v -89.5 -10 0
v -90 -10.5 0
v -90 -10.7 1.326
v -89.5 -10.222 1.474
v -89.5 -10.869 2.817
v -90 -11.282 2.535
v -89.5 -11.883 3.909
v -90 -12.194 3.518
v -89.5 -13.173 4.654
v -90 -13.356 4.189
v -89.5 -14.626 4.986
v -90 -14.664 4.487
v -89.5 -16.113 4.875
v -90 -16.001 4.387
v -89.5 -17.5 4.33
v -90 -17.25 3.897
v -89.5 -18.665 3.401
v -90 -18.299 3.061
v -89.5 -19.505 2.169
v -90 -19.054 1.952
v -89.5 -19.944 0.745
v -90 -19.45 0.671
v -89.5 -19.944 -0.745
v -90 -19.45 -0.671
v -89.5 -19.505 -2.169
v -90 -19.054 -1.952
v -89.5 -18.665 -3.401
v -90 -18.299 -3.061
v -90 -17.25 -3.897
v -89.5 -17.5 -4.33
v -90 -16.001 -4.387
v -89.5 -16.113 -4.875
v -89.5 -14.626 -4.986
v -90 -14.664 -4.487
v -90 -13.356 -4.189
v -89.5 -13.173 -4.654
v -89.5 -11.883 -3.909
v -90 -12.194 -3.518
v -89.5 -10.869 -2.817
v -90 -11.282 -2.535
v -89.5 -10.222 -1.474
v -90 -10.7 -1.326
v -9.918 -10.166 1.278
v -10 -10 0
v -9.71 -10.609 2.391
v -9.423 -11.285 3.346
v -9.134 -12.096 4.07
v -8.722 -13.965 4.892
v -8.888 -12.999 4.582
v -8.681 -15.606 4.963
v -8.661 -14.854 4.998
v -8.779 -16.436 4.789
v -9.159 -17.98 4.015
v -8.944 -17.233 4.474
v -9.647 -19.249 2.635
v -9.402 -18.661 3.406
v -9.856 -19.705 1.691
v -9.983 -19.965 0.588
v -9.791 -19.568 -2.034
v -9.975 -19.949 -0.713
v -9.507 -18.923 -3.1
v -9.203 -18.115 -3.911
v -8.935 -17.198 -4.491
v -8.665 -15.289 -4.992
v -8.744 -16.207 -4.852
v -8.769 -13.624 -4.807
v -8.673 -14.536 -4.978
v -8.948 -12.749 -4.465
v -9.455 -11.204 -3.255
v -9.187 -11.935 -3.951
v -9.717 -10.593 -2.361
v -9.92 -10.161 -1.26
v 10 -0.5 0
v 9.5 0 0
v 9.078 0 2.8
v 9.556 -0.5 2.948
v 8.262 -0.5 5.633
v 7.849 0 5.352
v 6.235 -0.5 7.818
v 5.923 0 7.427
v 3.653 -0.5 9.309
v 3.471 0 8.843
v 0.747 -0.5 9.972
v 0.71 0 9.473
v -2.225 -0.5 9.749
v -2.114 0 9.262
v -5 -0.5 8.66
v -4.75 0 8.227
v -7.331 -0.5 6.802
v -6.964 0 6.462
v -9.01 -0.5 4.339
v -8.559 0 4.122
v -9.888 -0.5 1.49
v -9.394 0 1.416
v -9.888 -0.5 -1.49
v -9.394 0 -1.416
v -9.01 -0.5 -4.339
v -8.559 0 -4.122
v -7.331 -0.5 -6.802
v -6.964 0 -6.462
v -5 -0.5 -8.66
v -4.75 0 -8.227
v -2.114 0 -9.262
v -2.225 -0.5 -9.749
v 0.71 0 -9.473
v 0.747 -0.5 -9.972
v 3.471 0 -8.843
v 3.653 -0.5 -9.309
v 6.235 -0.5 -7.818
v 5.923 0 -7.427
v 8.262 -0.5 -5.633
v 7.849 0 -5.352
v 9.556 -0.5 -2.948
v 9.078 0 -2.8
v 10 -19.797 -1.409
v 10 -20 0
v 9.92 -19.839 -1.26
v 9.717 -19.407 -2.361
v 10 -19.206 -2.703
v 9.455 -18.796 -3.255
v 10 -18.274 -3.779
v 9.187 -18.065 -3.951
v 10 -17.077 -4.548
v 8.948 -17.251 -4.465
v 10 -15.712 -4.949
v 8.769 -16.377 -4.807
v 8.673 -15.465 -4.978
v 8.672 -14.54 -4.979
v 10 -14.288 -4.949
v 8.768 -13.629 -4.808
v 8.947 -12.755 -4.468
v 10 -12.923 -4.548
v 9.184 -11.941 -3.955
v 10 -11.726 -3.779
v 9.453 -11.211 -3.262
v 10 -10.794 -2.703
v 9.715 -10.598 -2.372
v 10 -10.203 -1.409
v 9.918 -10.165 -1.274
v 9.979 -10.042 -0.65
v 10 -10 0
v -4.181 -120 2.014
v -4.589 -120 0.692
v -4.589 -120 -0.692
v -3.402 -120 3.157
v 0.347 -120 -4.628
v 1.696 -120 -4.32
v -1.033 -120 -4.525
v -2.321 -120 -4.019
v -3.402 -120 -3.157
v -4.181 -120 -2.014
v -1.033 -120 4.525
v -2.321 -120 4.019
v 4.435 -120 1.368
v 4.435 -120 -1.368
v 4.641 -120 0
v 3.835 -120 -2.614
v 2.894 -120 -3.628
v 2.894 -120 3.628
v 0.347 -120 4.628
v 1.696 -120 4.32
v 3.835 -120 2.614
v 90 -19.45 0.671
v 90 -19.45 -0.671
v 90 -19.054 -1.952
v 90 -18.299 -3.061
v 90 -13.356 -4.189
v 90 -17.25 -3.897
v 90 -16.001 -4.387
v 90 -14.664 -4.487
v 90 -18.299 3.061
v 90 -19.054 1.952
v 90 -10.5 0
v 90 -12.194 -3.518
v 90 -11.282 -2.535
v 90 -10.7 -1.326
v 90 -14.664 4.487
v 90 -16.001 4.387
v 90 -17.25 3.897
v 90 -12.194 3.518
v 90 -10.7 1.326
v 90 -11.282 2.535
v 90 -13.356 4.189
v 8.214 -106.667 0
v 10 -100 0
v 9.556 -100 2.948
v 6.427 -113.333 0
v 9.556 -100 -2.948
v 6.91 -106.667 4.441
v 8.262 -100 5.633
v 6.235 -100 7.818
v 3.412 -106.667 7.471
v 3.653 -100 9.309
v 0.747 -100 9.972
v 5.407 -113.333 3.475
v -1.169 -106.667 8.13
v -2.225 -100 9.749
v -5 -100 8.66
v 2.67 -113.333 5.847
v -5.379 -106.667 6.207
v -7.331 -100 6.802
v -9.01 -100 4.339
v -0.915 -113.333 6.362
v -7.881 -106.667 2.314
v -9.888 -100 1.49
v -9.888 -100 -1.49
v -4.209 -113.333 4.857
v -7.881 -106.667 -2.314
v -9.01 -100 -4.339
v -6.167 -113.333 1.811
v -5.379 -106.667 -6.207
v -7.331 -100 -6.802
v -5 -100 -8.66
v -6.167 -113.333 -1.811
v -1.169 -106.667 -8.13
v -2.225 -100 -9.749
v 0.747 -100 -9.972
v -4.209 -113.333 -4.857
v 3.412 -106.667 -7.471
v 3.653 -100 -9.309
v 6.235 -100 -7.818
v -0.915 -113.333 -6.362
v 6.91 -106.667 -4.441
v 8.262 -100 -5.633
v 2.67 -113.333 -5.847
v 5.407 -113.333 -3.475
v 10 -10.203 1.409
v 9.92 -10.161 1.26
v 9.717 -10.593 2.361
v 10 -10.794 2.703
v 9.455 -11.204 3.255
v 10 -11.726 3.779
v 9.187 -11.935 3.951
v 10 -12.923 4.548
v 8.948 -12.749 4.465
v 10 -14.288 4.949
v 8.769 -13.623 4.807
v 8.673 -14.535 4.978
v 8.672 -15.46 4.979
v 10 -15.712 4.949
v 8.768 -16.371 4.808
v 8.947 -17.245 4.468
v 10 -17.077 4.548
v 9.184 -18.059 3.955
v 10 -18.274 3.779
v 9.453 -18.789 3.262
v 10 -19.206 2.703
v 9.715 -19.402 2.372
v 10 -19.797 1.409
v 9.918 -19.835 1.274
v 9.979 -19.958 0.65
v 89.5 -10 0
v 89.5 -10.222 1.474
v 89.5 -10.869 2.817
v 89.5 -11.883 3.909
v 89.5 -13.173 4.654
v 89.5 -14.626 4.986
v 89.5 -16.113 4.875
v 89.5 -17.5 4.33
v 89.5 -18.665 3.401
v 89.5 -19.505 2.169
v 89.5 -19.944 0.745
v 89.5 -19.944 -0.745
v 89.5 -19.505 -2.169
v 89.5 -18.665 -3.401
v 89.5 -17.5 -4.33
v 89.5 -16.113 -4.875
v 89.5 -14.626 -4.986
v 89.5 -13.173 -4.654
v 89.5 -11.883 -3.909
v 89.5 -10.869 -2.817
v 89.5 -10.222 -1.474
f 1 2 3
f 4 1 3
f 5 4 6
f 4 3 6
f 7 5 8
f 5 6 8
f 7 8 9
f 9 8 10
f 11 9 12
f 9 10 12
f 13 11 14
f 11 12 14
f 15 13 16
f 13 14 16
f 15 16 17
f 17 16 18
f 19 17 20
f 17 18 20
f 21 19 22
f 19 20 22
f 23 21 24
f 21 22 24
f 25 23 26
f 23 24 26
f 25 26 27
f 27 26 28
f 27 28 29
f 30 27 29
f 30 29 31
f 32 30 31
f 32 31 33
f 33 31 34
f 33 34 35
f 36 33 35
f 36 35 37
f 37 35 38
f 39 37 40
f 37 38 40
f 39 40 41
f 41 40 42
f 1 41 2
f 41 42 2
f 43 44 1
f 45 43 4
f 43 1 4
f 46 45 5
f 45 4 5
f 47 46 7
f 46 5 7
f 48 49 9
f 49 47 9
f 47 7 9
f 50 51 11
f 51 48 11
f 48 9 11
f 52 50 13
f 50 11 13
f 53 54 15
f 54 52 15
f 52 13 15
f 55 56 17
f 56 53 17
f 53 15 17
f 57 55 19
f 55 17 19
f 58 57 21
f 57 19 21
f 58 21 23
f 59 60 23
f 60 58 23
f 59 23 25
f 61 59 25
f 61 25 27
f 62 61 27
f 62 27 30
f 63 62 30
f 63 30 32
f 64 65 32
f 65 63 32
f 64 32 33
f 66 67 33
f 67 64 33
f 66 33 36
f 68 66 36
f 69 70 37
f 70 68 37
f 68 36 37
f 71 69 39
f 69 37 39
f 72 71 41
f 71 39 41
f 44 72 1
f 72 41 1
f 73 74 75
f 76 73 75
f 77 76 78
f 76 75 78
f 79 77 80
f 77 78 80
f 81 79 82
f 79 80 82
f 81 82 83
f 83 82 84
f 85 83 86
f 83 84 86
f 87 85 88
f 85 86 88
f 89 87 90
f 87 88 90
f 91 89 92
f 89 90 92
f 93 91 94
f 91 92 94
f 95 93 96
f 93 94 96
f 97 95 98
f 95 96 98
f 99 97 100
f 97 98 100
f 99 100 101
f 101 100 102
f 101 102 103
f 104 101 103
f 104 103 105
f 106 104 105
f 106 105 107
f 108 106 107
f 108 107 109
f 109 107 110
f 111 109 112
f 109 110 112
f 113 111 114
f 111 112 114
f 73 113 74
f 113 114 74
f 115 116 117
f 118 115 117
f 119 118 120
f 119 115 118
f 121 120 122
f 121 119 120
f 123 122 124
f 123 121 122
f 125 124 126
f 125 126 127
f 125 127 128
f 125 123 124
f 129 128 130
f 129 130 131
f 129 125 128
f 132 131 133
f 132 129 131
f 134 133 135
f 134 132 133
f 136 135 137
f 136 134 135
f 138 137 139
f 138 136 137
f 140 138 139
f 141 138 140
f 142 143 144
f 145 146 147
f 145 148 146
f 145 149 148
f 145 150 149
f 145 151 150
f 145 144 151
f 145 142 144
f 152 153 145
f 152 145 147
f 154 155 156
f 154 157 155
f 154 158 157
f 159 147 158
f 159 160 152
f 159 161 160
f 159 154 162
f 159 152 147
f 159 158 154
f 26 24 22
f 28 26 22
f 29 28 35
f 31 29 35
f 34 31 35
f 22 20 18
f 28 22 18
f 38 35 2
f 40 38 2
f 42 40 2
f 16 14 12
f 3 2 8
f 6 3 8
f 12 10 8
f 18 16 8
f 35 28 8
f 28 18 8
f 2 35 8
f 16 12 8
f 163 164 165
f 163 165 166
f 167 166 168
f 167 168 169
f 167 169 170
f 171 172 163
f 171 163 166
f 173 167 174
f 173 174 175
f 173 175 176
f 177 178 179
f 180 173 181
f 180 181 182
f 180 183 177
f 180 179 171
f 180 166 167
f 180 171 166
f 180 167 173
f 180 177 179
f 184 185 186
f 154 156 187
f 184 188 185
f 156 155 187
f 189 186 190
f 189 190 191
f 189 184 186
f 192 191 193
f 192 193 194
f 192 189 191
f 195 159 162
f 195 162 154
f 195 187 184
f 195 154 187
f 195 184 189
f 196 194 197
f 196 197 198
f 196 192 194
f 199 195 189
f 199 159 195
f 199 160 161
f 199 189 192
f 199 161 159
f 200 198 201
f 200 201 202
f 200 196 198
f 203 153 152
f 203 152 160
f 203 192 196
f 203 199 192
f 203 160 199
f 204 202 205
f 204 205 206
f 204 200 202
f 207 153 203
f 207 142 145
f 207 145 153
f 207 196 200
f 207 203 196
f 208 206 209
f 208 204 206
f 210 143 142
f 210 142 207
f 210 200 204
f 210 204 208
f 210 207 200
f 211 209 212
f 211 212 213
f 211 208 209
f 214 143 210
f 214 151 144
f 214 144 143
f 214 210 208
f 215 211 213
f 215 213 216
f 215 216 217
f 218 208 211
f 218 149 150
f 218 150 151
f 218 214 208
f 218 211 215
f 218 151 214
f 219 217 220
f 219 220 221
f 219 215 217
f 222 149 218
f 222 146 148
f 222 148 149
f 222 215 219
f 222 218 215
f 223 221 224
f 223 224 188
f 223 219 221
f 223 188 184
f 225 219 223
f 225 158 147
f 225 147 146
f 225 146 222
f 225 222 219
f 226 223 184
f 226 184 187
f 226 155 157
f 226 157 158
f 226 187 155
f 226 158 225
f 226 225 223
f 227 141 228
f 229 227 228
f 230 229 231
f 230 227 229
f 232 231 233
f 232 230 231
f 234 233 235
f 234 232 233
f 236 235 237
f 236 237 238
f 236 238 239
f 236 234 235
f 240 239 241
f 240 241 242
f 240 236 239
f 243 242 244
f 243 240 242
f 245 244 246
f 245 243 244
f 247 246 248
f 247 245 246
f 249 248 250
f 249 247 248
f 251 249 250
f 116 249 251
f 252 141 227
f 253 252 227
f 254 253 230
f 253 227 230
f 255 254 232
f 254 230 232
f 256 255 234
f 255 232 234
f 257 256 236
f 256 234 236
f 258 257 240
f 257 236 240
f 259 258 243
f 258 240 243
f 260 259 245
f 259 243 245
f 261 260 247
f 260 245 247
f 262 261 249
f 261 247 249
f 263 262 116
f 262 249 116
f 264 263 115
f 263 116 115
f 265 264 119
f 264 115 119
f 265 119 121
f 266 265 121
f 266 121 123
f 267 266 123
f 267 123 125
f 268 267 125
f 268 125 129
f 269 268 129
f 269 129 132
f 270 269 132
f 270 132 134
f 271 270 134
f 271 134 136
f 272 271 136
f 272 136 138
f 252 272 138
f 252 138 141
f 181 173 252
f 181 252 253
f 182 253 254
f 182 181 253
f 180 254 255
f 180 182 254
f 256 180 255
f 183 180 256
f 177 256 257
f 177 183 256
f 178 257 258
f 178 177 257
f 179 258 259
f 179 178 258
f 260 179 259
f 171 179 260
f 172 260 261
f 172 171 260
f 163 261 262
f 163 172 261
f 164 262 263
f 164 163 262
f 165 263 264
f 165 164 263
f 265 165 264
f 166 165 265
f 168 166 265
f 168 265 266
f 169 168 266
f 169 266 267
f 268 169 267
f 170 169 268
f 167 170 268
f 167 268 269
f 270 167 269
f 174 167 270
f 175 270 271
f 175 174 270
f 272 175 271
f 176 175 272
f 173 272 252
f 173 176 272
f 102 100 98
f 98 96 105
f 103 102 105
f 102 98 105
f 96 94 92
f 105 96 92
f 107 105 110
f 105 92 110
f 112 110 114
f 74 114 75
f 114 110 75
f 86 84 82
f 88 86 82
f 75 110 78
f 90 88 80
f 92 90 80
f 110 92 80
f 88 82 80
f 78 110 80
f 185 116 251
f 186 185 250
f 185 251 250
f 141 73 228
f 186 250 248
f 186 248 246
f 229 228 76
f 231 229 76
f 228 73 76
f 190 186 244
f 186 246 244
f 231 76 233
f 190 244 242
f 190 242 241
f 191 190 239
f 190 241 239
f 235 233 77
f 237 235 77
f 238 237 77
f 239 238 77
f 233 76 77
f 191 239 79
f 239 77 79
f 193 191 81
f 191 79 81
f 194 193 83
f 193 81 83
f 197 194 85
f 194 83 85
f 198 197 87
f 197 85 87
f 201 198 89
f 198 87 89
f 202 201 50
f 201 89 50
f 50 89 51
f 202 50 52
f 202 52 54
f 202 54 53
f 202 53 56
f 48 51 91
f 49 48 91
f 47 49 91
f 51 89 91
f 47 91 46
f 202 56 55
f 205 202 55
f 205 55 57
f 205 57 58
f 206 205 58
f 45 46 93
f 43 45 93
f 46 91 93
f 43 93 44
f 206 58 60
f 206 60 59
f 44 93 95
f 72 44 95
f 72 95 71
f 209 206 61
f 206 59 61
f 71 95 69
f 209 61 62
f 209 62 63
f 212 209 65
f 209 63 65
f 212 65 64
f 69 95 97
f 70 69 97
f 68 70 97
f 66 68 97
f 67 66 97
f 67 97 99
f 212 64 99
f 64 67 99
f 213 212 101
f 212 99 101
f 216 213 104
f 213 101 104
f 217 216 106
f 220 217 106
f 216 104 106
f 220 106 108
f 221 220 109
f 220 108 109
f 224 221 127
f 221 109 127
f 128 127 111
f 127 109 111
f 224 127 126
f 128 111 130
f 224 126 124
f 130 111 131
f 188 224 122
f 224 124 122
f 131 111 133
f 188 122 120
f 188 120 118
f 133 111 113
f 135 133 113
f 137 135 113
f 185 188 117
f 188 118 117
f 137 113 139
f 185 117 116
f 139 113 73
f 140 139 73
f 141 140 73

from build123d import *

# Parameters (mm, degrees)
F0_R          = 10
F1_DEPTH      = 100
F2_R          = 10
F3_DEPTH      = 20
F3_TAPER      = 15
F5_R          = 5
F6_DEPTH      = 80
F6_DEPTH_BACK = 3
F8_R          = 5
F9_DEPTH      = 80
F9_DEPTH_BACK = 3
F10_SIZE      = 0.5


with BuildPart() as f1:
    # F0 (on Front) → F1 (new body)
    with BuildSketch(Plane.XZ):
        Circle(F0_R)
    extrude(amount=F1_DEPTH)

    # F2 (on face) → F3 (join)
    with BuildSketch(Plane.XZ.offset(100)):
        Circle(F2_R)
    extrude(amount=F3_DEPTH, taper=F3_TAPER)

    # F5 (on offset) → F6 (join, two sides)
    with BuildSketch(Plane.YZ.offset(10)) as f6_sk:
        with Locations((-15, 0)):
            Circle(F5_R)
    extrude(amount=F6_DEPTH)
    extrude(f6_sk.sketch, amount=-F6_DEPTH_BACK)

    # F8 (on offset) → F9 (join, two sides)
    with BuildSketch(Plane.YZ.offset(-10)) as f9_sk:
        with Locations((-15, 0)):
            Circle(F8_R)
    extrude(amount=-F9_DEPTH)
    extrude(f9_sk.sketch, amount=F9_DEPTH_BACK)

    # F10
    f10_edges = [f1.edges().sort_by_distance(p)[0] for p in [
        (-90, -20, 0),
        (-10, 0, 0),
        (90, -20, 0),
    ]]
    chamfer(f10_edges, length=F10_SIZE)


solid = f1.part
